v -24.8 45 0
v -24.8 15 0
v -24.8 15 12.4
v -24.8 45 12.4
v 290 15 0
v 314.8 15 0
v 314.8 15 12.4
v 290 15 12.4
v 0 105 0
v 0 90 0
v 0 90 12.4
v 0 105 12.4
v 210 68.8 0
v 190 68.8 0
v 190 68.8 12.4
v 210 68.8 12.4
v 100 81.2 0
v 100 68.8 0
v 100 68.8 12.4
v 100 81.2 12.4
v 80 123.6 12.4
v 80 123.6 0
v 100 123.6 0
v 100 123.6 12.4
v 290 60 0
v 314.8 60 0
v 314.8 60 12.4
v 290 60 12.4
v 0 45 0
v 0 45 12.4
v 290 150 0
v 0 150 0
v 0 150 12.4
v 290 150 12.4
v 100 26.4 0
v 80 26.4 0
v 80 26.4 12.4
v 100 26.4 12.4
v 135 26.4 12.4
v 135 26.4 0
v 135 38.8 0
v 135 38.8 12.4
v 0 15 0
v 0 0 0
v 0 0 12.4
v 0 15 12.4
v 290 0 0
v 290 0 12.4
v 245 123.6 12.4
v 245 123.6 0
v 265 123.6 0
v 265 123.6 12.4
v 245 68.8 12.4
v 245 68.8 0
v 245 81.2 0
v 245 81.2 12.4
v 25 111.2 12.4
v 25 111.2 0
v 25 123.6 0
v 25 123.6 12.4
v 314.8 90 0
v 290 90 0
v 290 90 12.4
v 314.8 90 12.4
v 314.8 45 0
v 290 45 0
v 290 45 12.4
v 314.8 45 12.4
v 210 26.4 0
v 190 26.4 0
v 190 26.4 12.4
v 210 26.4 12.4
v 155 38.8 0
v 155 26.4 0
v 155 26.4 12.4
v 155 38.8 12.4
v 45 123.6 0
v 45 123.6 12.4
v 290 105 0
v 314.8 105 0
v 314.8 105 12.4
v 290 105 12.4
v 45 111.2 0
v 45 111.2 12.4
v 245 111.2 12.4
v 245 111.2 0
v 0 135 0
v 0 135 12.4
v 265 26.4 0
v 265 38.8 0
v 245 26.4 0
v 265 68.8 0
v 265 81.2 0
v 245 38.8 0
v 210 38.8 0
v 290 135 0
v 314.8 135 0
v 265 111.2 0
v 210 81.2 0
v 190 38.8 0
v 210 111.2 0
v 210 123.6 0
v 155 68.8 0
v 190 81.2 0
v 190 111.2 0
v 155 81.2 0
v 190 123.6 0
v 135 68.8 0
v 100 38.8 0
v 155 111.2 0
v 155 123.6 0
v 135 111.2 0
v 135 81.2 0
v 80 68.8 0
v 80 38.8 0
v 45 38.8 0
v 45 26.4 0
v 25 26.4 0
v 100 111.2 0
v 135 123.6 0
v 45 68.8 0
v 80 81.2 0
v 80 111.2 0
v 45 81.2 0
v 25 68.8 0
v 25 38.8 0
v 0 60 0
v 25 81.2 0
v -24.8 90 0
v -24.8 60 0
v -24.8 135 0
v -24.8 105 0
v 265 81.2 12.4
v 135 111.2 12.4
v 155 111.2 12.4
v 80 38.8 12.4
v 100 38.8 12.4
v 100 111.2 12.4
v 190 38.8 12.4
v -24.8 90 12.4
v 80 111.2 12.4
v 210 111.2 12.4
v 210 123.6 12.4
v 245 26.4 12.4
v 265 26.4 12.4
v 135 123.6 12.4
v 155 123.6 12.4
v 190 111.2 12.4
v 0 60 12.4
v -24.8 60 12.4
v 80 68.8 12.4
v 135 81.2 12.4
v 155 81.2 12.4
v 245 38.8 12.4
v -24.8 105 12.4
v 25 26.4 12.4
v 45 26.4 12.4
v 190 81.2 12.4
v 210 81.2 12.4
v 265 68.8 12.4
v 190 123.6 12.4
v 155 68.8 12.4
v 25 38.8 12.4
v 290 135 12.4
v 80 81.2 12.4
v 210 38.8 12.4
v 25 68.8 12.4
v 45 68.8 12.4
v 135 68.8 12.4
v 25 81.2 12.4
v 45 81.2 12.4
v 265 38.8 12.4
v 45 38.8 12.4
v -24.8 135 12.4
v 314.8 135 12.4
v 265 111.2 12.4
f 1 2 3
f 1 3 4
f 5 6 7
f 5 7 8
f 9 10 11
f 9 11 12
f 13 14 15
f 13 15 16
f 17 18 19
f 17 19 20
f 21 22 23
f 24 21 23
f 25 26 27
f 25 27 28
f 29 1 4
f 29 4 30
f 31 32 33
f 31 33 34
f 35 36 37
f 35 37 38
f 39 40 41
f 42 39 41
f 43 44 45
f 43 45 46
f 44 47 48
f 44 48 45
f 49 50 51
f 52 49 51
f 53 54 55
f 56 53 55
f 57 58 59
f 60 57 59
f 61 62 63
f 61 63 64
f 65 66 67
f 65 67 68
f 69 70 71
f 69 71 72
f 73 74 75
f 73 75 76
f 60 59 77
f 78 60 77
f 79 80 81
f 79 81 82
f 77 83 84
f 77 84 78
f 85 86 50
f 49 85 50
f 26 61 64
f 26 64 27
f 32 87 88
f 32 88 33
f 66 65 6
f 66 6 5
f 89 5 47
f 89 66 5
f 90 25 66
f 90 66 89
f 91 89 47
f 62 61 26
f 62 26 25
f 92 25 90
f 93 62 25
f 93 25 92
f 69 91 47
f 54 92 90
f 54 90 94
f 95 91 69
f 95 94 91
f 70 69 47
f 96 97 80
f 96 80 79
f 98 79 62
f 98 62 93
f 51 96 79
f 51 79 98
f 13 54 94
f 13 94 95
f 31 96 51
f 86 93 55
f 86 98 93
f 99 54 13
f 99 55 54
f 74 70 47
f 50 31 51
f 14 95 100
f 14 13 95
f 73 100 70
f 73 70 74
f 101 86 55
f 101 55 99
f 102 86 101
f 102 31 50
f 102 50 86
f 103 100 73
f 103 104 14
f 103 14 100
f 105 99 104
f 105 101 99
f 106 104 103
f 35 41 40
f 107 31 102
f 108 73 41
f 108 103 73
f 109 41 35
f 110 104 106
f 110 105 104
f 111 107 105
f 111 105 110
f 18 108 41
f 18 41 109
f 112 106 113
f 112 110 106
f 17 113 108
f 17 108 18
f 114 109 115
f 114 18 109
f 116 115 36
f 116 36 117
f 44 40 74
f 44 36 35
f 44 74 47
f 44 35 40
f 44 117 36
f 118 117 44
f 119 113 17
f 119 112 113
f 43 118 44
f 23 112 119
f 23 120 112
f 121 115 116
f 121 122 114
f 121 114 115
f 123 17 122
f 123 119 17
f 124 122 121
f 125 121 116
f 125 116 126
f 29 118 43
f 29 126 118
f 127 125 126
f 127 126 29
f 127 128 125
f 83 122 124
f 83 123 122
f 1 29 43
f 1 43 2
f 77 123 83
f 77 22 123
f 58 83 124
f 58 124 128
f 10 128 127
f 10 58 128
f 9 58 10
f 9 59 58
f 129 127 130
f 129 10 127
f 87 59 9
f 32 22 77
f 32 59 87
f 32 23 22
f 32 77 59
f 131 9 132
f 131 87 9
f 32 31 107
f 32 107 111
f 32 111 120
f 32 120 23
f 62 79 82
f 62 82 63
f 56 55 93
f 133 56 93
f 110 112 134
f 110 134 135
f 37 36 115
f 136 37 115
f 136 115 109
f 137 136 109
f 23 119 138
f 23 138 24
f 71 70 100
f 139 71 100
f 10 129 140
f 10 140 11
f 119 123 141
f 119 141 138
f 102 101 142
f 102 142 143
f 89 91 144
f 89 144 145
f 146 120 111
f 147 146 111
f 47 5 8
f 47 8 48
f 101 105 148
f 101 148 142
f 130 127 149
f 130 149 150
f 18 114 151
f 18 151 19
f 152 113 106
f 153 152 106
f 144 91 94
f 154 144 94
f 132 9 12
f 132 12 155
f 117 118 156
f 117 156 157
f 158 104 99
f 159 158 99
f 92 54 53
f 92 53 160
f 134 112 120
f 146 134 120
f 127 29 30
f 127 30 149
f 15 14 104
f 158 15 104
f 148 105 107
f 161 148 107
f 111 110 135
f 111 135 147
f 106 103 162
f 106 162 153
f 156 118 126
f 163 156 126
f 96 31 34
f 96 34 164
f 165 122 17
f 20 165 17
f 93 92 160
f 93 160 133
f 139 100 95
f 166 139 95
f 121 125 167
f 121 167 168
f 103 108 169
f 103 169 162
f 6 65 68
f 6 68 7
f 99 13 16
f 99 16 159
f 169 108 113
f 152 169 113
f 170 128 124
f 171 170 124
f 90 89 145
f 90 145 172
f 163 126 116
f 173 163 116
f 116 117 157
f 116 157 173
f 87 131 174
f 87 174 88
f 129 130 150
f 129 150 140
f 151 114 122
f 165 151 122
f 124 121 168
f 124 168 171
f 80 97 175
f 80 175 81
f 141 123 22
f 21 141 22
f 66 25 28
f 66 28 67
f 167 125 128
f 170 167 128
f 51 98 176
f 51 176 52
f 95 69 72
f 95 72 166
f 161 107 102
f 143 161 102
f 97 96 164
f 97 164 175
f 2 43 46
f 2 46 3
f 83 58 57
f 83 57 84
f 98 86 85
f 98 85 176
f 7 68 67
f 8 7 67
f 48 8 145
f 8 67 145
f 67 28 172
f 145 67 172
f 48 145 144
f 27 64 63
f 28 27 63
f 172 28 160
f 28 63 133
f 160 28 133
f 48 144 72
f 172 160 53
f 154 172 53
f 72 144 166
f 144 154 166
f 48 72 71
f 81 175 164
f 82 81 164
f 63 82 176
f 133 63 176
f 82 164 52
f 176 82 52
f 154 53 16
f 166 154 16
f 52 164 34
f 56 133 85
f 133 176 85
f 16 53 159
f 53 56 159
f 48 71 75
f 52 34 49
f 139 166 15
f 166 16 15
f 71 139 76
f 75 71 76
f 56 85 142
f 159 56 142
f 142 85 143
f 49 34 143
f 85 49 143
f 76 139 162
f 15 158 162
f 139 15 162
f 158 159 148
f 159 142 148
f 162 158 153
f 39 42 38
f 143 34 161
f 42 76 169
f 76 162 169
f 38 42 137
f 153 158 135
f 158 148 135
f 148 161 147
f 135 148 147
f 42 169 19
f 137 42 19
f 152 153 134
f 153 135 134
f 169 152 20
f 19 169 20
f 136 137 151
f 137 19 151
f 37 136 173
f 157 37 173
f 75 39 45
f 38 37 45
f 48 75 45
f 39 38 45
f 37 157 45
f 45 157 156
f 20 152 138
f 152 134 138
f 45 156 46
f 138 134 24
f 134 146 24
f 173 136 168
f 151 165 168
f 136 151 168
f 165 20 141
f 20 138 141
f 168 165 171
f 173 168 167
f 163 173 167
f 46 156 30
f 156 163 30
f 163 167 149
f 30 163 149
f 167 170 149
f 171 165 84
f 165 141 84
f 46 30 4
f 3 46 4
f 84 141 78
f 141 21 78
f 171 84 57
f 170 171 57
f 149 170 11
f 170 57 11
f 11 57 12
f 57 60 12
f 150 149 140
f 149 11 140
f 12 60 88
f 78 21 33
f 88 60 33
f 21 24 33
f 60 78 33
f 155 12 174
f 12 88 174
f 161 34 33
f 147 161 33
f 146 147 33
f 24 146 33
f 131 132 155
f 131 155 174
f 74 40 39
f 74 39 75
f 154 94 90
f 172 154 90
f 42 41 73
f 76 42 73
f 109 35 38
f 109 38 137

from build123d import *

# Parameters (mm, degrees)
MODEL_W             = 20
MODEL_H             = 12.4
BOSS_EXTRUDE1_DEPTH = 12.4


with BuildPart() as part:
    # Model → Boss-Extrude1 (new body)
    with BuildSketch(Plane.XY):
        Polygon((0, 135), (0, 150), (290, 150), (290, 135), (314.8, 135), (314.8, 105), (290, 105), (290, 90), (314.8, 90), (314.8, 60), (290, 60), (290, 45), (314.8, 45), (314.8, 15), (290, 15), (290, 0), (0, 0), (0, 15), (-24.8, 15), (-24.8, 45), (0, 45), (0, 60), (-24.8, 60), (-24.8, 90), (0, 90), (0, 105), (-24.8, 105), (-24.8, 135), align=None)
        with Locations((200, 117.4)):
            Rectangle(MODEL_W, MODEL_H, mode=Mode.SUBTRACT)
        with Locations((145, 117.4)):
            Rectangle(MODEL_W, MODEL_H, mode=Mode.SUBTRACT)
        with Locations((255, 117.4)):
            Rectangle(MODEL_W, MODEL_H, mode=Mode.SUBTRACT)
        with Locations((200, 75)):
            Rectangle(MODEL_W, MODEL_H, mode=Mode.SUBTRACT)
        with Locations((255, 75)):
            Rectangle(MODEL_W, MODEL_H, mode=Mode.SUBTRACT)
        with Locations((200, 32.6)):
            Rectangle(MODEL_W, MODEL_H, mode=Mode.SUBTRACT)
        with Locations((255, 32.6)):
            Rectangle(MODEL_W, MODEL_H, mode=Mode.SUBTRACT)
        with Locations((145, 75)):
            Rectangle(MODEL_W, MODEL_H, mode=Mode.SUBTRACT)
        with Locations((145, 32.6)):
            Rectangle(MODEL_W, MODEL_H, mode=Mode.SUBTRACT)
        with Locations((90, 117.4)):
            Rectangle(MODEL_W, MODEL_H, mode=Mode.SUBTRACT)
        with Locations((35, 117.4)):
            Rectangle(MODEL_W, MODEL_H, mode=Mode.SUBTRACT)
        with Locations((90, 75)):
            Rectangle(MODEL_W, MODEL_H, mode=Mode.SUBTRACT)
        with Locations((35, 75)):
            Rectangle(MODEL_W, MODEL_H, mode=Mode.SUBTRACT)
        with Locations((90, 32.6)):
            Rectangle(MODEL_W, MODEL_H, mode=Mode.SUBTRACT)
        with Locations((35, 32.6)):
            Rectangle(MODEL_W, MODEL_H, mode=Mode.SUBTRACT)
    extrude(amount=BOSS_EXTRUDE1_DEPTH)


solid = part.part
